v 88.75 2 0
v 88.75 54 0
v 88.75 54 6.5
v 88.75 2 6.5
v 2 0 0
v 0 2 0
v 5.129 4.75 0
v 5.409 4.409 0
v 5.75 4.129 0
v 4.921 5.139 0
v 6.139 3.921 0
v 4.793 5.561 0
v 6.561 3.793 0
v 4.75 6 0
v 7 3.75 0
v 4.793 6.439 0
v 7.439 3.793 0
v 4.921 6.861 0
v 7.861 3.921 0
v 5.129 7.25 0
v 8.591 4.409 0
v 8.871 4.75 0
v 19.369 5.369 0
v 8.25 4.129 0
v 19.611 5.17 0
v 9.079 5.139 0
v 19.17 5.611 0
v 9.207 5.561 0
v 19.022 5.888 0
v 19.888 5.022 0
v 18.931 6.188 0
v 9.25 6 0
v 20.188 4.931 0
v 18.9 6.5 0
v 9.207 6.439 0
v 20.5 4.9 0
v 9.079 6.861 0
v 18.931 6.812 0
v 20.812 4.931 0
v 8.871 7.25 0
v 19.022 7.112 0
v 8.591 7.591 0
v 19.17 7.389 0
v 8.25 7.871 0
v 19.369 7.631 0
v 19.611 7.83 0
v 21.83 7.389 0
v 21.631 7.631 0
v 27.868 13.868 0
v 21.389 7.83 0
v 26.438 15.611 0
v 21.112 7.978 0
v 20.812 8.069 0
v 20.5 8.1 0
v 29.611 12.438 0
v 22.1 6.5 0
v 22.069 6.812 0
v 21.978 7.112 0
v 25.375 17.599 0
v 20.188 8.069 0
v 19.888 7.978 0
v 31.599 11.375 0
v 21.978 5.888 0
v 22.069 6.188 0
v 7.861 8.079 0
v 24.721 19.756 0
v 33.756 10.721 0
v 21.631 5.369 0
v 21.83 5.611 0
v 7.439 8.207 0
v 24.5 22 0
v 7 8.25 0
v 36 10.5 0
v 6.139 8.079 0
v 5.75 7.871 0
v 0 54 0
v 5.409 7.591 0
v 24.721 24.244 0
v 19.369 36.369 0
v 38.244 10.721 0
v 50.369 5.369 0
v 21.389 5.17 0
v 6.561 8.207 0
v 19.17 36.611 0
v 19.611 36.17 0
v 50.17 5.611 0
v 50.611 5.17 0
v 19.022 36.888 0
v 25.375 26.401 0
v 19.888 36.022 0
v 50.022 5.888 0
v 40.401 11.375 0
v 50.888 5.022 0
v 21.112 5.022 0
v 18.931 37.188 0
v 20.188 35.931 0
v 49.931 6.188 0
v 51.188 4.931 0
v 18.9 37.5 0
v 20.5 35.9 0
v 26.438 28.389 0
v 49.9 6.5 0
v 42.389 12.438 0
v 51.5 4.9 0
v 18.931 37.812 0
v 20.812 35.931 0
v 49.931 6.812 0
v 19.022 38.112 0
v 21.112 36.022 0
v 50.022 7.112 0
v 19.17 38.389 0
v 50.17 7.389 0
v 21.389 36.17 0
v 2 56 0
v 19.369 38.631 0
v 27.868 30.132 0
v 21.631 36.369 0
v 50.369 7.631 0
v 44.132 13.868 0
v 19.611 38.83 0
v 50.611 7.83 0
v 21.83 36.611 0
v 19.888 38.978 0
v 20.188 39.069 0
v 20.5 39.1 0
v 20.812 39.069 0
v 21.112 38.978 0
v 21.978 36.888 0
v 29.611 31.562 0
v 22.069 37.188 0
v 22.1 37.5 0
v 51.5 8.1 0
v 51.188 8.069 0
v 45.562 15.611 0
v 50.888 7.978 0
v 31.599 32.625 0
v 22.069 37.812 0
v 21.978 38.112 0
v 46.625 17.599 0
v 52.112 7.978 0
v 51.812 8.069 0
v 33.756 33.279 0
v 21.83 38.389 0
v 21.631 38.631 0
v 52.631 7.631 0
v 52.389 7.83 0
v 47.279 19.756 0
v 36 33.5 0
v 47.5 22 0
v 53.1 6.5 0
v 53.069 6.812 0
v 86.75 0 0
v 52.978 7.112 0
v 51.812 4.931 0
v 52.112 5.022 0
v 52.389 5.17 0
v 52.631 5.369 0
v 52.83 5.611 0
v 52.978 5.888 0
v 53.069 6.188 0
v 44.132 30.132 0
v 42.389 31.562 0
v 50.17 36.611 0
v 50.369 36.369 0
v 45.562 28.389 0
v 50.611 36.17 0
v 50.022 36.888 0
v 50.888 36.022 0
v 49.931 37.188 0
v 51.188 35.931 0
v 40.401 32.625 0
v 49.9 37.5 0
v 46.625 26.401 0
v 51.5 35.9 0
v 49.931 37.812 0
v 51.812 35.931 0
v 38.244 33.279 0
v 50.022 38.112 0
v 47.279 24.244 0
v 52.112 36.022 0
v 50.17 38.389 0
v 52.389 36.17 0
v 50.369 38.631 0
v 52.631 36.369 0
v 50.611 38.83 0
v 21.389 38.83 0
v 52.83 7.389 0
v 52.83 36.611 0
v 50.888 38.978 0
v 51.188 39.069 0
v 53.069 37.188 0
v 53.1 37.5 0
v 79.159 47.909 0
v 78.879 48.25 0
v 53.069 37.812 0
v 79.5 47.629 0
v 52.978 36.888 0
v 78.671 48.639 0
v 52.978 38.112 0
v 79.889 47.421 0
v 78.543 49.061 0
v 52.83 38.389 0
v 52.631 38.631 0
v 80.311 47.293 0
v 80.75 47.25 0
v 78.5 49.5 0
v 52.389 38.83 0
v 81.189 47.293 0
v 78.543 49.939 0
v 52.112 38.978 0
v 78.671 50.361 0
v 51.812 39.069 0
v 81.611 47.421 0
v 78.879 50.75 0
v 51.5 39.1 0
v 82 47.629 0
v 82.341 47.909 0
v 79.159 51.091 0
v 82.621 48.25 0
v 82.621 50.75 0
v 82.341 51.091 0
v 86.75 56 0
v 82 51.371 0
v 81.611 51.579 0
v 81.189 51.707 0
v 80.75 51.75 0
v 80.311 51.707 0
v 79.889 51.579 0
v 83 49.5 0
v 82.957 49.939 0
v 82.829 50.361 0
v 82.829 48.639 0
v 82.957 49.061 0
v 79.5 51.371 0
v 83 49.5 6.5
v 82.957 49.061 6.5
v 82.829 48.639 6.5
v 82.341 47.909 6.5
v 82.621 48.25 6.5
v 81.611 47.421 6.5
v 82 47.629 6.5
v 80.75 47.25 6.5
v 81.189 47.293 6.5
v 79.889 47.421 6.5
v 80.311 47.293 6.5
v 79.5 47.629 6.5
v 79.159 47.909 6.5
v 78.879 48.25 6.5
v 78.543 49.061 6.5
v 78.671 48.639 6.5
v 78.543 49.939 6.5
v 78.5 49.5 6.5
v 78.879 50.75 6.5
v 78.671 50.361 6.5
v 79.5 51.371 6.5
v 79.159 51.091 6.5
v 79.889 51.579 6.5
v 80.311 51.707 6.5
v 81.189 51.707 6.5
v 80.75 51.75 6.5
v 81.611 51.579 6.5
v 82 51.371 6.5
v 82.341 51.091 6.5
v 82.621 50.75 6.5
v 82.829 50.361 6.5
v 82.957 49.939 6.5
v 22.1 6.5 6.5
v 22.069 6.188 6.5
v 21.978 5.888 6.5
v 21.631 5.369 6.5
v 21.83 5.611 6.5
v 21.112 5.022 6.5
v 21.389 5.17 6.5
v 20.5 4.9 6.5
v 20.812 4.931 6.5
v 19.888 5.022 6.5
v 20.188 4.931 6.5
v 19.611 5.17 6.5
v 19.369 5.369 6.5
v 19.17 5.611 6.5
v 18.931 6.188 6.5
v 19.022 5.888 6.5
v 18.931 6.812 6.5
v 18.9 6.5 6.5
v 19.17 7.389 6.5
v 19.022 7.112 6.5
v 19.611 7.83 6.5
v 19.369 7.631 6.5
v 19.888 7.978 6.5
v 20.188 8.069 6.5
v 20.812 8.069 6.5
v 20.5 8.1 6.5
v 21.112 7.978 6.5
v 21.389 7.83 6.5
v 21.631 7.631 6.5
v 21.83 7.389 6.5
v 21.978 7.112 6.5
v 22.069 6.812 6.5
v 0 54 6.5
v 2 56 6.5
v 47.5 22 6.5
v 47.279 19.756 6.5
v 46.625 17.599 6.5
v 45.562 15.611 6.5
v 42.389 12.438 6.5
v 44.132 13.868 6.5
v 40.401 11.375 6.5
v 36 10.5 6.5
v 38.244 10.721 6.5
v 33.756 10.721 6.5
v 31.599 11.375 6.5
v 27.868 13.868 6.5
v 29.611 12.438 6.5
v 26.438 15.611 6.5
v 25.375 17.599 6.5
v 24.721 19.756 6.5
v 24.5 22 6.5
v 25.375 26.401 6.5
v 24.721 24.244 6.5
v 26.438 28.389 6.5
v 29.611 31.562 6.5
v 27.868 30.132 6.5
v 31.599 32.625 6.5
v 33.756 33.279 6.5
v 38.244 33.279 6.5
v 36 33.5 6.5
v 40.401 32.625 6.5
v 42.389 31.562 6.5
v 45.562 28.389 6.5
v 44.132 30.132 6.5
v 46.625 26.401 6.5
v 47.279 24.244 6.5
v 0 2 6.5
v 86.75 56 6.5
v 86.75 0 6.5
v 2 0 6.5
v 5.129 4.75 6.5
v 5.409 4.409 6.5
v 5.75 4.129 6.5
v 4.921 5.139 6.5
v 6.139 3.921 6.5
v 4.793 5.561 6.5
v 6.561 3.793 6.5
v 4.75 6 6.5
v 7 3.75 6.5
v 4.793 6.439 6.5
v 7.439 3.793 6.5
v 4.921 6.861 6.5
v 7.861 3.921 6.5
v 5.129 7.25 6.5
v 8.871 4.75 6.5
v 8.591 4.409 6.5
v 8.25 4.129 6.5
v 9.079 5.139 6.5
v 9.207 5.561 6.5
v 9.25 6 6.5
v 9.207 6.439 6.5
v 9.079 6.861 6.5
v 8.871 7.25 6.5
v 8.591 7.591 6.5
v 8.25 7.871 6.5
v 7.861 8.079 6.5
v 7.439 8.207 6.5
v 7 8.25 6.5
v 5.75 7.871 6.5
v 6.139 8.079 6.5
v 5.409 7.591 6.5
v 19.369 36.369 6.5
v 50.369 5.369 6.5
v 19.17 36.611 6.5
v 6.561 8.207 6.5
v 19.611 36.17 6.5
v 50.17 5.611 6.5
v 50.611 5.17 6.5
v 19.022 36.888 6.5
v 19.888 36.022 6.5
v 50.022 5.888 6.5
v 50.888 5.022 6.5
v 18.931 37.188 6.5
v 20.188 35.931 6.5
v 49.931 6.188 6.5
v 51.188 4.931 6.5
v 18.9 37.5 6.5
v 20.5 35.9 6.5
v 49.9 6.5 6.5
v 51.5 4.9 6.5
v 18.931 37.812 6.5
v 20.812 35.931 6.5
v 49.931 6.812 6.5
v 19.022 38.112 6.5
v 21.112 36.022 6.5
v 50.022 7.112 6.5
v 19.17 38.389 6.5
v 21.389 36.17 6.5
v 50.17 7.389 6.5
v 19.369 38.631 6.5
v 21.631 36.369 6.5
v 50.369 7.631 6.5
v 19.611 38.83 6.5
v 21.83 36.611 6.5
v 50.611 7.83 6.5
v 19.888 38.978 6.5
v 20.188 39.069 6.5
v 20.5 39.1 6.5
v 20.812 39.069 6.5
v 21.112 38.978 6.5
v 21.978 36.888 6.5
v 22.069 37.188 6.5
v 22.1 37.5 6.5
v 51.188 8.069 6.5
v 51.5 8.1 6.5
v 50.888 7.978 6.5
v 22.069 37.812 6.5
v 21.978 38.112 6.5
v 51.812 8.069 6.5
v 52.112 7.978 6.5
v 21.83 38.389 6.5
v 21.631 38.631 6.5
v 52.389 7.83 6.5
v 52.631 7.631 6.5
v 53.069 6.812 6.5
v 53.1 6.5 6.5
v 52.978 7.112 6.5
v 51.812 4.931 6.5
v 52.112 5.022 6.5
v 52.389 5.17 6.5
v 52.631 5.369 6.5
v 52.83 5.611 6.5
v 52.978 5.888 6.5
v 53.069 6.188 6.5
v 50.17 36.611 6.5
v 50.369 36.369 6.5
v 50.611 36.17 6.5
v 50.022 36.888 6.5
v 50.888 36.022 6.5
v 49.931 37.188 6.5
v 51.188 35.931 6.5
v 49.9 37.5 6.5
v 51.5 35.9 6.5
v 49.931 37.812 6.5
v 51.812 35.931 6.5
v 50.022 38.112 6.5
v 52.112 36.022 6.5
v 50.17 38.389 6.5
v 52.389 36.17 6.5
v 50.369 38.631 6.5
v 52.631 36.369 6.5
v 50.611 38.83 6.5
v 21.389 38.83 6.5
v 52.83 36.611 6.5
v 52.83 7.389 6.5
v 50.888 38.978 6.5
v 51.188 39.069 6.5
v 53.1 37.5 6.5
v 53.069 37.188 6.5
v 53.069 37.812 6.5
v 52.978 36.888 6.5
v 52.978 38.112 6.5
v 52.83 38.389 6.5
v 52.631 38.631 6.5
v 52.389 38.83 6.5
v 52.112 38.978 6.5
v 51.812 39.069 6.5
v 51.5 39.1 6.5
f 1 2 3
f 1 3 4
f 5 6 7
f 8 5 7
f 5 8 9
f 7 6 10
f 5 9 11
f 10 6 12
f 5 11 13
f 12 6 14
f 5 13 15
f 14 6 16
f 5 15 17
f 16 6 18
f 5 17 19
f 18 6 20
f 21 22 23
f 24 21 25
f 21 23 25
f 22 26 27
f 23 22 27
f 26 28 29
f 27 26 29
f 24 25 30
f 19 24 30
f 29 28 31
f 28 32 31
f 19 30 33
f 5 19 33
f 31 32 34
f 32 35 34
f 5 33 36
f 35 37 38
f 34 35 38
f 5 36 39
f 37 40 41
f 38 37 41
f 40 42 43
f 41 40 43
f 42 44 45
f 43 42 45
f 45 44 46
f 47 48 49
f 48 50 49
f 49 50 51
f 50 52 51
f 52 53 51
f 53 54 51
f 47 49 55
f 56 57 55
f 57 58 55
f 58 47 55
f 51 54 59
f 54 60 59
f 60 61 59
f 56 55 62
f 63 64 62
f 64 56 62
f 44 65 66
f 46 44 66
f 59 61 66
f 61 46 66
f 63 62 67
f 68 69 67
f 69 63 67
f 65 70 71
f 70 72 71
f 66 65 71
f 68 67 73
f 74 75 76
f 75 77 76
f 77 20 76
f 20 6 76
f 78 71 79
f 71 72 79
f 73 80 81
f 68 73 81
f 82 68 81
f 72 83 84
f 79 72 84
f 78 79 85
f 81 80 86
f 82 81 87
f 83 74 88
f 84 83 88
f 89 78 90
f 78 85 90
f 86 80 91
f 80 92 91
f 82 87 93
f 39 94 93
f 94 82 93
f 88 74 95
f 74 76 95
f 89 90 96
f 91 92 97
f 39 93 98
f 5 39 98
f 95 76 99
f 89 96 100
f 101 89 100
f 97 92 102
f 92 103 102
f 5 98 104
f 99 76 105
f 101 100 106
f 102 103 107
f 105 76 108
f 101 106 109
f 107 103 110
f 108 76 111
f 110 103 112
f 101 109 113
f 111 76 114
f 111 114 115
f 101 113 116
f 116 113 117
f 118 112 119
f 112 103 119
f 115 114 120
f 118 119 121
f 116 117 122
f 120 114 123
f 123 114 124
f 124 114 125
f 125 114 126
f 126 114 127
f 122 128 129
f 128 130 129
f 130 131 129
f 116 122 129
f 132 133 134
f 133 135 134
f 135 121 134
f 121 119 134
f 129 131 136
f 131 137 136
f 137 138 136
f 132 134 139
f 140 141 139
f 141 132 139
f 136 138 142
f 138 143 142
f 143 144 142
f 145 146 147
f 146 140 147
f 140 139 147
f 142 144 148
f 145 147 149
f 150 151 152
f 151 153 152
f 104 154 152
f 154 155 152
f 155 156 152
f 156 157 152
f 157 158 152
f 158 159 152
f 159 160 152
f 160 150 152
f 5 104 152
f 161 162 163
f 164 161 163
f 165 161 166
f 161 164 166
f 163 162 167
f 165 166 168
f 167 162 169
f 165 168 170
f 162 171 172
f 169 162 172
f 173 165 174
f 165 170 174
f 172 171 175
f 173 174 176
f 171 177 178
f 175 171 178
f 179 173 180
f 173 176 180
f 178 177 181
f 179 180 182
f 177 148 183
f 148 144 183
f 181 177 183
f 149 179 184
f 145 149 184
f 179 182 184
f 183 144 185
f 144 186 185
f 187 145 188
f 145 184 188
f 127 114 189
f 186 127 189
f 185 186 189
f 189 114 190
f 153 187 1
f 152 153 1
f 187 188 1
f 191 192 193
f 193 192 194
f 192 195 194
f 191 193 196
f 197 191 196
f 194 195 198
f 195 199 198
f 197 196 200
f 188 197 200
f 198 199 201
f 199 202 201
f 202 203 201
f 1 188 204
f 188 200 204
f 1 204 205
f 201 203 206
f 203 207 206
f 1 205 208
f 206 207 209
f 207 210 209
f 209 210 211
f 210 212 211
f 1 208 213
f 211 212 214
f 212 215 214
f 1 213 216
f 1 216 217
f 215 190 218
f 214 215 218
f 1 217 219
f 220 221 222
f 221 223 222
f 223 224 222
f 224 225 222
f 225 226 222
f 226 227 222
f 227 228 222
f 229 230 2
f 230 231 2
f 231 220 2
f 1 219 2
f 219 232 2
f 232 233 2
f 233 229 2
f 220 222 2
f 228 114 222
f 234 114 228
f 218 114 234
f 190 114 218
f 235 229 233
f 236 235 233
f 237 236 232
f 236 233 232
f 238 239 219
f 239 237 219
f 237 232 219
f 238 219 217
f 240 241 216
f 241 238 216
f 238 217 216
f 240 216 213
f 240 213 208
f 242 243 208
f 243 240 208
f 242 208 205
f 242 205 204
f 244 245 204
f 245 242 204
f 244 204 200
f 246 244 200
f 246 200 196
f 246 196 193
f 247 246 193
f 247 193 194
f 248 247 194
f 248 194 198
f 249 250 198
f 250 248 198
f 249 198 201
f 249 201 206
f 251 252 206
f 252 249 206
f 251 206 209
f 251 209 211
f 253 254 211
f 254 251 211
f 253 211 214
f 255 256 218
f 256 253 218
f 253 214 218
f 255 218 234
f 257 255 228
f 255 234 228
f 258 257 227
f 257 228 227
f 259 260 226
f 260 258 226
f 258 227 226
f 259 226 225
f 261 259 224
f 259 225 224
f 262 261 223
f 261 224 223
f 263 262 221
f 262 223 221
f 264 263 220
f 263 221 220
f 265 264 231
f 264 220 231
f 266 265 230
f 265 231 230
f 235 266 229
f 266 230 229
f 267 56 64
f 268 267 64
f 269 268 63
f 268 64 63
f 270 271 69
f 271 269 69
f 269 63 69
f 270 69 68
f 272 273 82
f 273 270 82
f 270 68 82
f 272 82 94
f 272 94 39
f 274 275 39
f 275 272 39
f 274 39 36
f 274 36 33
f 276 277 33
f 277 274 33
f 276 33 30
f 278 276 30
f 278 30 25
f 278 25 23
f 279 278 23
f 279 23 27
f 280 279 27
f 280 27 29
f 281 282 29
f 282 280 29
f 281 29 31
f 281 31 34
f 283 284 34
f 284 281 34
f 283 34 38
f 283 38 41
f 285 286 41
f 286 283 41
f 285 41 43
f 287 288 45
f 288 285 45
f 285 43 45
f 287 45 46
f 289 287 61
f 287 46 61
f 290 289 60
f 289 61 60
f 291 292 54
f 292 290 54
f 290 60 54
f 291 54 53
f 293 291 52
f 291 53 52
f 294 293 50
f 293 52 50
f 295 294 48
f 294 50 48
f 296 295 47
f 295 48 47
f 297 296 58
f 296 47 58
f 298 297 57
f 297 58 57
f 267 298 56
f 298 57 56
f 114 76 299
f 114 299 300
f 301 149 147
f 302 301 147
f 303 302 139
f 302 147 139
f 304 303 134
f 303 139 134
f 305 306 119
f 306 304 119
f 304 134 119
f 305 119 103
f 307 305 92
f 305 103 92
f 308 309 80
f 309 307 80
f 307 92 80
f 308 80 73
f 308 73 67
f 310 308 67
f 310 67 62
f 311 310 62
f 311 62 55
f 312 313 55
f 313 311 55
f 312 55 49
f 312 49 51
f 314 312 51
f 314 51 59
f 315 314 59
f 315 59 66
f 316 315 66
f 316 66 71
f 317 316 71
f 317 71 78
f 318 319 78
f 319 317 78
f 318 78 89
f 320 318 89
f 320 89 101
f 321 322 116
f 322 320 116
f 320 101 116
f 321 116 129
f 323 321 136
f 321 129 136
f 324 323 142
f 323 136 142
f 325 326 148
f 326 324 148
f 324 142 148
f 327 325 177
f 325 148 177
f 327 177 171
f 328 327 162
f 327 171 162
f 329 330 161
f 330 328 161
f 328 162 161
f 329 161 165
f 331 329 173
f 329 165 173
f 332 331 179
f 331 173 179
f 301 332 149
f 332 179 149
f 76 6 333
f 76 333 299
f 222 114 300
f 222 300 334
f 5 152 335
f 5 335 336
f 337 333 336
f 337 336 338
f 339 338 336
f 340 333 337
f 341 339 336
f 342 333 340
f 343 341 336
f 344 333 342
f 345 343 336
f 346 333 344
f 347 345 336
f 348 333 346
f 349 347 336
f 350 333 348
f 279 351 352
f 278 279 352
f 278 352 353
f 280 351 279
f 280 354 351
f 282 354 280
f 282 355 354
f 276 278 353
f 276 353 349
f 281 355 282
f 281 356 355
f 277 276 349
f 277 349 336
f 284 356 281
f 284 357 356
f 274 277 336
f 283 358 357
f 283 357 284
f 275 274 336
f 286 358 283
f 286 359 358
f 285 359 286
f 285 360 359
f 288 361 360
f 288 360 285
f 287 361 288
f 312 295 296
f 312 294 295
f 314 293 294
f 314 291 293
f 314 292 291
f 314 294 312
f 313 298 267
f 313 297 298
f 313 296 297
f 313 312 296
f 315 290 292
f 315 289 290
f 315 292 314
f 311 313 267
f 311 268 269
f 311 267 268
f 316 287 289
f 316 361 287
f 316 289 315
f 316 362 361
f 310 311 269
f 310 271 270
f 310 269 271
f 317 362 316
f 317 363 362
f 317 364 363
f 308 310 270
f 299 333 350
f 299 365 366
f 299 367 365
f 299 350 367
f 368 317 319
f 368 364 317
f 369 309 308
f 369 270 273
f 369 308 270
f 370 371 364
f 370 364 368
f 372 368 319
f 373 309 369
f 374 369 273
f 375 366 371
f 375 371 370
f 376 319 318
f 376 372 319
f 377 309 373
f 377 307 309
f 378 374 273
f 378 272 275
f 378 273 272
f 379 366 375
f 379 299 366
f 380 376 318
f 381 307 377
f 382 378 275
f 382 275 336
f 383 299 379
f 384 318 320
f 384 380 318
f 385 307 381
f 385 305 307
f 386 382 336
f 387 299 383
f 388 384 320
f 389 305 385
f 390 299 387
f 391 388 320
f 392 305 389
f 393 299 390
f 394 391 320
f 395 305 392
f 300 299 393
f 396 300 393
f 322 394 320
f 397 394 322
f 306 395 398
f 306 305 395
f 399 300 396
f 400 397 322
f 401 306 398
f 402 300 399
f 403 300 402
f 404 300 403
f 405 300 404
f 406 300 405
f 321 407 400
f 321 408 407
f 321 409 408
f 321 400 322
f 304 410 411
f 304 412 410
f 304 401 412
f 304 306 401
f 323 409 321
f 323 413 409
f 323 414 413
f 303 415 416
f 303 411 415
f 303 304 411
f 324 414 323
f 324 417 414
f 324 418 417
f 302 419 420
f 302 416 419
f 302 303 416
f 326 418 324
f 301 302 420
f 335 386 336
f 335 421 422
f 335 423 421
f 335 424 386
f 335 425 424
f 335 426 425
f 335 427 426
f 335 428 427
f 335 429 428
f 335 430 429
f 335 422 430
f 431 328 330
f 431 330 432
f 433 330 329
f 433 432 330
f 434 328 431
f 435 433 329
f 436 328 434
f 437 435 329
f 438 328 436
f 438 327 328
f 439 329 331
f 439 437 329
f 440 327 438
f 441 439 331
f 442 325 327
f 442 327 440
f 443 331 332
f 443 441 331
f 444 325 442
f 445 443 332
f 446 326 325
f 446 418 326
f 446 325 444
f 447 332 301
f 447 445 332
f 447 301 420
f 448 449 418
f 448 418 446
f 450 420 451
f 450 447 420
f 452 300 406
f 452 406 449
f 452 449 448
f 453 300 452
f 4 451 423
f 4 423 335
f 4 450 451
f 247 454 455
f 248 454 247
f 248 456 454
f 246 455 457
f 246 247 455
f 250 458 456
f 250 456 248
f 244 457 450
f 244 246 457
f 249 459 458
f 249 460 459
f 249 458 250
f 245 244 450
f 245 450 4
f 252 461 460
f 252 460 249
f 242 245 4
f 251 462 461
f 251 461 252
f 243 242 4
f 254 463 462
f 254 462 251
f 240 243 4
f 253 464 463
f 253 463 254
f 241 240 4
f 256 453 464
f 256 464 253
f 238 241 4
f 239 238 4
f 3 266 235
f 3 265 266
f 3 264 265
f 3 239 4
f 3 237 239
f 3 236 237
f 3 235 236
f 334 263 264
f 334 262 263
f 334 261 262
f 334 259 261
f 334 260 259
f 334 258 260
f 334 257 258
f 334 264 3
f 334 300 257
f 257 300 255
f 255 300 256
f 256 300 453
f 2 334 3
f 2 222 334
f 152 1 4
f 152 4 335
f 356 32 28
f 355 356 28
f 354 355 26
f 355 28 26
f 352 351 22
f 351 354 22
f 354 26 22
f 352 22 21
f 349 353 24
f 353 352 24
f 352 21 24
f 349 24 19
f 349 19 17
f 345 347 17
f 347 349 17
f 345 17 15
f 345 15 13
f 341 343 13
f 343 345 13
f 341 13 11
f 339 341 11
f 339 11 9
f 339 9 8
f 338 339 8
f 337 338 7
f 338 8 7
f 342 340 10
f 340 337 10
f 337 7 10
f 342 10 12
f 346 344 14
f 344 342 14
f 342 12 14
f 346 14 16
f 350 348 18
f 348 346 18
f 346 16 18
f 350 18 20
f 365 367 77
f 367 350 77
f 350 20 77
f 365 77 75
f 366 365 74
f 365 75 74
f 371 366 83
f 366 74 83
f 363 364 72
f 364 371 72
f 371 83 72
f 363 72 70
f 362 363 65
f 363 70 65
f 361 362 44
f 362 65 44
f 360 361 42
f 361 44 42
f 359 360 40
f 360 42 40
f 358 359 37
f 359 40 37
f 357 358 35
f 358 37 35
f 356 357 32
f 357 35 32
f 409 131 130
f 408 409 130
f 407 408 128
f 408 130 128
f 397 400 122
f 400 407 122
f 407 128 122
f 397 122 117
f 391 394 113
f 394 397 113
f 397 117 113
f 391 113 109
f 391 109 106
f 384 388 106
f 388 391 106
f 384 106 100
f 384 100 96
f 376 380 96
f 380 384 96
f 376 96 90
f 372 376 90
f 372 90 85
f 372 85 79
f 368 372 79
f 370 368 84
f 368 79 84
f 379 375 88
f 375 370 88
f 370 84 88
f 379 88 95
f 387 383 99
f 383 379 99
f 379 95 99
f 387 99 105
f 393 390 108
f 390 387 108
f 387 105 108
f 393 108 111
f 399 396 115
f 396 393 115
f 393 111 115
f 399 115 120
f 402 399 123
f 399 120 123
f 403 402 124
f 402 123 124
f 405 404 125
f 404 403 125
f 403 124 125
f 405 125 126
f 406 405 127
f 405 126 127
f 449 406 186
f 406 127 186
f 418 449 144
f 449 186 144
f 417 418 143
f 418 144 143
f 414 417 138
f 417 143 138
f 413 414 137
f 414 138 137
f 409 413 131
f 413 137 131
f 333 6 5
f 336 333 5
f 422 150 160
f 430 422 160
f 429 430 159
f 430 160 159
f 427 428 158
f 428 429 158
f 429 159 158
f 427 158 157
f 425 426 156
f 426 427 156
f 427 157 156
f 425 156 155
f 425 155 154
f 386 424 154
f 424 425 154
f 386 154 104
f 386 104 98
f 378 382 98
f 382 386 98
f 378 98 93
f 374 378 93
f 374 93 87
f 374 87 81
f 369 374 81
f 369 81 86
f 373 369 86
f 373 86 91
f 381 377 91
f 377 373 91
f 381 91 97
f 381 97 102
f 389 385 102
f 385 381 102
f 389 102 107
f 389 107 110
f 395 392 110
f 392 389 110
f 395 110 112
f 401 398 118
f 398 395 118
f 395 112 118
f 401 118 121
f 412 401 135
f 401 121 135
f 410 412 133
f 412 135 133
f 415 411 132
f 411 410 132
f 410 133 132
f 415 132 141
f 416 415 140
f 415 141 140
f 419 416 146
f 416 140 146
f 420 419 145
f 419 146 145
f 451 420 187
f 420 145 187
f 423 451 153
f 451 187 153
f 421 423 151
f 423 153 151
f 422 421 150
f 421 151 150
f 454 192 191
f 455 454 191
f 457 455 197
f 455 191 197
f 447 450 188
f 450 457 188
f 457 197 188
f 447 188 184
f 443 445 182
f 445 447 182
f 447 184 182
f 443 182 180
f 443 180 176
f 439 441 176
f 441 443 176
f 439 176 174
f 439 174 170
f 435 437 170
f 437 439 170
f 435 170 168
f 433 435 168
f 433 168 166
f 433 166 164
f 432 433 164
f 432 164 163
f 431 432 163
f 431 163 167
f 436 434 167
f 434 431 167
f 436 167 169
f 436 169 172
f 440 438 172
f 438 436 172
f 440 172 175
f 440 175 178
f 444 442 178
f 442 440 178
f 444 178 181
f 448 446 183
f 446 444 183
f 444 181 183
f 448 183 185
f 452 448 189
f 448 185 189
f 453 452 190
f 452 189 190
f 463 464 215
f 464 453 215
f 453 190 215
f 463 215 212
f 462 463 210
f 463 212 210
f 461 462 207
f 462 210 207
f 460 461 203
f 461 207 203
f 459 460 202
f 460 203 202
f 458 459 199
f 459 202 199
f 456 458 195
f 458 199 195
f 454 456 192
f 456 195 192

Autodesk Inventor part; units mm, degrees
ref_plane "YZ Plane" through (0, 0, 0) normal (1, 0, 0) x (0, 1, 0)
ref_plane "XZ Plane" through (0, 0, 0) normal (0, 1, 0) x (-1, 0, 0)
ref_plane "XY Plane" through (0, 0, 0) normal (0, 0, 1) x (1, 0, 0)
sketch "Sketch1" plane through (0, 0, 0) normal (0, 0, 1) x (1, 0, 0)
  line L0 (20.5, 37.5) -> (51.5, 37.5) construction
  line L1 (51.5, 37.5) -> (51.5, 6.5) construction
  line L2 (51.5, 6.5) -> (20.5, 6.5) construction
  line L3 (20.5, 6.5) -> (20.5, 37.5) construction
  line L4 (14.62, 43.38) -> (57.38, 43.38) construction
  line L5 (57.38, 43.38) -> (57.38, 0.62) construction
  line L6 (57.38, 0.62) -> (14.62, 0.62) construction
  line L7 (14.62, 0.62) -> (14.62, 43.38) construction
  circle A0 centre (20.5, 6.5) radius 1.6
  circle A1 centre (51.5, 6.5) radius 1.6
  circle A2 centre (51.5, 37.5) radius 1.6
  circle A3 centre (20.5, 37.5) radius 1.6
  circle A4 centre (36, 22) radius 11.5
  circle A5 centre (13, 22) radius 4 construction
  circle A6 centre (7, 6) radius 2.25
  circle A7 centre (80.75, 49.5) radius 2.25
  line L8 (2, 56) -> (86.75, 56)
  line L9 (88.75, 54) -> (88.75, 2)
  line L10 (86.75, 0) -> (2, 0)
  line L11 (0, 2) -> (0, 54)
  line L12 (0, 2) -> (2, 0)
  line L13 (0, 54) -> (2, 56)
  line L14 (86.75, 56) -> (88.75, 54)
  line L15 (88.75, 2) -> (86.75, 0)
  circle A8 centre (7, 6) radius 4.5 construction
  circle A9 centre (80.75, 49.5) radius 4.5 construction
  point P0 (0, 0)
  point P1 (36, 37.5)
  point P2 (51.5, 22)
  point P3 (14.62, 22)
  point P4 (36, 43.38)
  point P5 (0, 56)
  point P6 (88.75, 0)
  point P7 (88.75, 56)
  point P8 (0, 0)
  dimension "d0" = 31
  dimension "d1" = 42.76
  dimension "d2" = 3.2
  dimension "d3" = 23
  dimension "d4" = 8
  dimension "d5" = 23
  dimension "d6" = 4.5
  dimension "d7" = 2
  dimension "d8" = 2
  dimension "d9" = 2
  dimension "d10" = 2
  dimension "d11" = 2
  dimension "d12" = 2
  dimension "d13" = 2
  dimension "d14" = 2
  dimension "d15" = 22
  dimension "d16" = 9
  dimension "d17" = 6
  dimension "d18" = 6
  dimension "d19" = 29.25
  dimension "d20" = 12
  dimension "d22" = 36
  dimension "d23" = 34
  dimension "d26" = 8
extrude "Extrusion1" add sketch "Sketch1" along normal blind 6.5
equation "\"d8\" = d7"
equation "\"d9\" = d7"
equation "\"d10\" = d9"
equation "\"d11\" = d7"
equation "\"d12\" = d11"
equation "\"d13\" = d7"
equation "\"d14\" = d13"
properties part number "z_rod_stopper_bottom" material "Plywood, Finish"
